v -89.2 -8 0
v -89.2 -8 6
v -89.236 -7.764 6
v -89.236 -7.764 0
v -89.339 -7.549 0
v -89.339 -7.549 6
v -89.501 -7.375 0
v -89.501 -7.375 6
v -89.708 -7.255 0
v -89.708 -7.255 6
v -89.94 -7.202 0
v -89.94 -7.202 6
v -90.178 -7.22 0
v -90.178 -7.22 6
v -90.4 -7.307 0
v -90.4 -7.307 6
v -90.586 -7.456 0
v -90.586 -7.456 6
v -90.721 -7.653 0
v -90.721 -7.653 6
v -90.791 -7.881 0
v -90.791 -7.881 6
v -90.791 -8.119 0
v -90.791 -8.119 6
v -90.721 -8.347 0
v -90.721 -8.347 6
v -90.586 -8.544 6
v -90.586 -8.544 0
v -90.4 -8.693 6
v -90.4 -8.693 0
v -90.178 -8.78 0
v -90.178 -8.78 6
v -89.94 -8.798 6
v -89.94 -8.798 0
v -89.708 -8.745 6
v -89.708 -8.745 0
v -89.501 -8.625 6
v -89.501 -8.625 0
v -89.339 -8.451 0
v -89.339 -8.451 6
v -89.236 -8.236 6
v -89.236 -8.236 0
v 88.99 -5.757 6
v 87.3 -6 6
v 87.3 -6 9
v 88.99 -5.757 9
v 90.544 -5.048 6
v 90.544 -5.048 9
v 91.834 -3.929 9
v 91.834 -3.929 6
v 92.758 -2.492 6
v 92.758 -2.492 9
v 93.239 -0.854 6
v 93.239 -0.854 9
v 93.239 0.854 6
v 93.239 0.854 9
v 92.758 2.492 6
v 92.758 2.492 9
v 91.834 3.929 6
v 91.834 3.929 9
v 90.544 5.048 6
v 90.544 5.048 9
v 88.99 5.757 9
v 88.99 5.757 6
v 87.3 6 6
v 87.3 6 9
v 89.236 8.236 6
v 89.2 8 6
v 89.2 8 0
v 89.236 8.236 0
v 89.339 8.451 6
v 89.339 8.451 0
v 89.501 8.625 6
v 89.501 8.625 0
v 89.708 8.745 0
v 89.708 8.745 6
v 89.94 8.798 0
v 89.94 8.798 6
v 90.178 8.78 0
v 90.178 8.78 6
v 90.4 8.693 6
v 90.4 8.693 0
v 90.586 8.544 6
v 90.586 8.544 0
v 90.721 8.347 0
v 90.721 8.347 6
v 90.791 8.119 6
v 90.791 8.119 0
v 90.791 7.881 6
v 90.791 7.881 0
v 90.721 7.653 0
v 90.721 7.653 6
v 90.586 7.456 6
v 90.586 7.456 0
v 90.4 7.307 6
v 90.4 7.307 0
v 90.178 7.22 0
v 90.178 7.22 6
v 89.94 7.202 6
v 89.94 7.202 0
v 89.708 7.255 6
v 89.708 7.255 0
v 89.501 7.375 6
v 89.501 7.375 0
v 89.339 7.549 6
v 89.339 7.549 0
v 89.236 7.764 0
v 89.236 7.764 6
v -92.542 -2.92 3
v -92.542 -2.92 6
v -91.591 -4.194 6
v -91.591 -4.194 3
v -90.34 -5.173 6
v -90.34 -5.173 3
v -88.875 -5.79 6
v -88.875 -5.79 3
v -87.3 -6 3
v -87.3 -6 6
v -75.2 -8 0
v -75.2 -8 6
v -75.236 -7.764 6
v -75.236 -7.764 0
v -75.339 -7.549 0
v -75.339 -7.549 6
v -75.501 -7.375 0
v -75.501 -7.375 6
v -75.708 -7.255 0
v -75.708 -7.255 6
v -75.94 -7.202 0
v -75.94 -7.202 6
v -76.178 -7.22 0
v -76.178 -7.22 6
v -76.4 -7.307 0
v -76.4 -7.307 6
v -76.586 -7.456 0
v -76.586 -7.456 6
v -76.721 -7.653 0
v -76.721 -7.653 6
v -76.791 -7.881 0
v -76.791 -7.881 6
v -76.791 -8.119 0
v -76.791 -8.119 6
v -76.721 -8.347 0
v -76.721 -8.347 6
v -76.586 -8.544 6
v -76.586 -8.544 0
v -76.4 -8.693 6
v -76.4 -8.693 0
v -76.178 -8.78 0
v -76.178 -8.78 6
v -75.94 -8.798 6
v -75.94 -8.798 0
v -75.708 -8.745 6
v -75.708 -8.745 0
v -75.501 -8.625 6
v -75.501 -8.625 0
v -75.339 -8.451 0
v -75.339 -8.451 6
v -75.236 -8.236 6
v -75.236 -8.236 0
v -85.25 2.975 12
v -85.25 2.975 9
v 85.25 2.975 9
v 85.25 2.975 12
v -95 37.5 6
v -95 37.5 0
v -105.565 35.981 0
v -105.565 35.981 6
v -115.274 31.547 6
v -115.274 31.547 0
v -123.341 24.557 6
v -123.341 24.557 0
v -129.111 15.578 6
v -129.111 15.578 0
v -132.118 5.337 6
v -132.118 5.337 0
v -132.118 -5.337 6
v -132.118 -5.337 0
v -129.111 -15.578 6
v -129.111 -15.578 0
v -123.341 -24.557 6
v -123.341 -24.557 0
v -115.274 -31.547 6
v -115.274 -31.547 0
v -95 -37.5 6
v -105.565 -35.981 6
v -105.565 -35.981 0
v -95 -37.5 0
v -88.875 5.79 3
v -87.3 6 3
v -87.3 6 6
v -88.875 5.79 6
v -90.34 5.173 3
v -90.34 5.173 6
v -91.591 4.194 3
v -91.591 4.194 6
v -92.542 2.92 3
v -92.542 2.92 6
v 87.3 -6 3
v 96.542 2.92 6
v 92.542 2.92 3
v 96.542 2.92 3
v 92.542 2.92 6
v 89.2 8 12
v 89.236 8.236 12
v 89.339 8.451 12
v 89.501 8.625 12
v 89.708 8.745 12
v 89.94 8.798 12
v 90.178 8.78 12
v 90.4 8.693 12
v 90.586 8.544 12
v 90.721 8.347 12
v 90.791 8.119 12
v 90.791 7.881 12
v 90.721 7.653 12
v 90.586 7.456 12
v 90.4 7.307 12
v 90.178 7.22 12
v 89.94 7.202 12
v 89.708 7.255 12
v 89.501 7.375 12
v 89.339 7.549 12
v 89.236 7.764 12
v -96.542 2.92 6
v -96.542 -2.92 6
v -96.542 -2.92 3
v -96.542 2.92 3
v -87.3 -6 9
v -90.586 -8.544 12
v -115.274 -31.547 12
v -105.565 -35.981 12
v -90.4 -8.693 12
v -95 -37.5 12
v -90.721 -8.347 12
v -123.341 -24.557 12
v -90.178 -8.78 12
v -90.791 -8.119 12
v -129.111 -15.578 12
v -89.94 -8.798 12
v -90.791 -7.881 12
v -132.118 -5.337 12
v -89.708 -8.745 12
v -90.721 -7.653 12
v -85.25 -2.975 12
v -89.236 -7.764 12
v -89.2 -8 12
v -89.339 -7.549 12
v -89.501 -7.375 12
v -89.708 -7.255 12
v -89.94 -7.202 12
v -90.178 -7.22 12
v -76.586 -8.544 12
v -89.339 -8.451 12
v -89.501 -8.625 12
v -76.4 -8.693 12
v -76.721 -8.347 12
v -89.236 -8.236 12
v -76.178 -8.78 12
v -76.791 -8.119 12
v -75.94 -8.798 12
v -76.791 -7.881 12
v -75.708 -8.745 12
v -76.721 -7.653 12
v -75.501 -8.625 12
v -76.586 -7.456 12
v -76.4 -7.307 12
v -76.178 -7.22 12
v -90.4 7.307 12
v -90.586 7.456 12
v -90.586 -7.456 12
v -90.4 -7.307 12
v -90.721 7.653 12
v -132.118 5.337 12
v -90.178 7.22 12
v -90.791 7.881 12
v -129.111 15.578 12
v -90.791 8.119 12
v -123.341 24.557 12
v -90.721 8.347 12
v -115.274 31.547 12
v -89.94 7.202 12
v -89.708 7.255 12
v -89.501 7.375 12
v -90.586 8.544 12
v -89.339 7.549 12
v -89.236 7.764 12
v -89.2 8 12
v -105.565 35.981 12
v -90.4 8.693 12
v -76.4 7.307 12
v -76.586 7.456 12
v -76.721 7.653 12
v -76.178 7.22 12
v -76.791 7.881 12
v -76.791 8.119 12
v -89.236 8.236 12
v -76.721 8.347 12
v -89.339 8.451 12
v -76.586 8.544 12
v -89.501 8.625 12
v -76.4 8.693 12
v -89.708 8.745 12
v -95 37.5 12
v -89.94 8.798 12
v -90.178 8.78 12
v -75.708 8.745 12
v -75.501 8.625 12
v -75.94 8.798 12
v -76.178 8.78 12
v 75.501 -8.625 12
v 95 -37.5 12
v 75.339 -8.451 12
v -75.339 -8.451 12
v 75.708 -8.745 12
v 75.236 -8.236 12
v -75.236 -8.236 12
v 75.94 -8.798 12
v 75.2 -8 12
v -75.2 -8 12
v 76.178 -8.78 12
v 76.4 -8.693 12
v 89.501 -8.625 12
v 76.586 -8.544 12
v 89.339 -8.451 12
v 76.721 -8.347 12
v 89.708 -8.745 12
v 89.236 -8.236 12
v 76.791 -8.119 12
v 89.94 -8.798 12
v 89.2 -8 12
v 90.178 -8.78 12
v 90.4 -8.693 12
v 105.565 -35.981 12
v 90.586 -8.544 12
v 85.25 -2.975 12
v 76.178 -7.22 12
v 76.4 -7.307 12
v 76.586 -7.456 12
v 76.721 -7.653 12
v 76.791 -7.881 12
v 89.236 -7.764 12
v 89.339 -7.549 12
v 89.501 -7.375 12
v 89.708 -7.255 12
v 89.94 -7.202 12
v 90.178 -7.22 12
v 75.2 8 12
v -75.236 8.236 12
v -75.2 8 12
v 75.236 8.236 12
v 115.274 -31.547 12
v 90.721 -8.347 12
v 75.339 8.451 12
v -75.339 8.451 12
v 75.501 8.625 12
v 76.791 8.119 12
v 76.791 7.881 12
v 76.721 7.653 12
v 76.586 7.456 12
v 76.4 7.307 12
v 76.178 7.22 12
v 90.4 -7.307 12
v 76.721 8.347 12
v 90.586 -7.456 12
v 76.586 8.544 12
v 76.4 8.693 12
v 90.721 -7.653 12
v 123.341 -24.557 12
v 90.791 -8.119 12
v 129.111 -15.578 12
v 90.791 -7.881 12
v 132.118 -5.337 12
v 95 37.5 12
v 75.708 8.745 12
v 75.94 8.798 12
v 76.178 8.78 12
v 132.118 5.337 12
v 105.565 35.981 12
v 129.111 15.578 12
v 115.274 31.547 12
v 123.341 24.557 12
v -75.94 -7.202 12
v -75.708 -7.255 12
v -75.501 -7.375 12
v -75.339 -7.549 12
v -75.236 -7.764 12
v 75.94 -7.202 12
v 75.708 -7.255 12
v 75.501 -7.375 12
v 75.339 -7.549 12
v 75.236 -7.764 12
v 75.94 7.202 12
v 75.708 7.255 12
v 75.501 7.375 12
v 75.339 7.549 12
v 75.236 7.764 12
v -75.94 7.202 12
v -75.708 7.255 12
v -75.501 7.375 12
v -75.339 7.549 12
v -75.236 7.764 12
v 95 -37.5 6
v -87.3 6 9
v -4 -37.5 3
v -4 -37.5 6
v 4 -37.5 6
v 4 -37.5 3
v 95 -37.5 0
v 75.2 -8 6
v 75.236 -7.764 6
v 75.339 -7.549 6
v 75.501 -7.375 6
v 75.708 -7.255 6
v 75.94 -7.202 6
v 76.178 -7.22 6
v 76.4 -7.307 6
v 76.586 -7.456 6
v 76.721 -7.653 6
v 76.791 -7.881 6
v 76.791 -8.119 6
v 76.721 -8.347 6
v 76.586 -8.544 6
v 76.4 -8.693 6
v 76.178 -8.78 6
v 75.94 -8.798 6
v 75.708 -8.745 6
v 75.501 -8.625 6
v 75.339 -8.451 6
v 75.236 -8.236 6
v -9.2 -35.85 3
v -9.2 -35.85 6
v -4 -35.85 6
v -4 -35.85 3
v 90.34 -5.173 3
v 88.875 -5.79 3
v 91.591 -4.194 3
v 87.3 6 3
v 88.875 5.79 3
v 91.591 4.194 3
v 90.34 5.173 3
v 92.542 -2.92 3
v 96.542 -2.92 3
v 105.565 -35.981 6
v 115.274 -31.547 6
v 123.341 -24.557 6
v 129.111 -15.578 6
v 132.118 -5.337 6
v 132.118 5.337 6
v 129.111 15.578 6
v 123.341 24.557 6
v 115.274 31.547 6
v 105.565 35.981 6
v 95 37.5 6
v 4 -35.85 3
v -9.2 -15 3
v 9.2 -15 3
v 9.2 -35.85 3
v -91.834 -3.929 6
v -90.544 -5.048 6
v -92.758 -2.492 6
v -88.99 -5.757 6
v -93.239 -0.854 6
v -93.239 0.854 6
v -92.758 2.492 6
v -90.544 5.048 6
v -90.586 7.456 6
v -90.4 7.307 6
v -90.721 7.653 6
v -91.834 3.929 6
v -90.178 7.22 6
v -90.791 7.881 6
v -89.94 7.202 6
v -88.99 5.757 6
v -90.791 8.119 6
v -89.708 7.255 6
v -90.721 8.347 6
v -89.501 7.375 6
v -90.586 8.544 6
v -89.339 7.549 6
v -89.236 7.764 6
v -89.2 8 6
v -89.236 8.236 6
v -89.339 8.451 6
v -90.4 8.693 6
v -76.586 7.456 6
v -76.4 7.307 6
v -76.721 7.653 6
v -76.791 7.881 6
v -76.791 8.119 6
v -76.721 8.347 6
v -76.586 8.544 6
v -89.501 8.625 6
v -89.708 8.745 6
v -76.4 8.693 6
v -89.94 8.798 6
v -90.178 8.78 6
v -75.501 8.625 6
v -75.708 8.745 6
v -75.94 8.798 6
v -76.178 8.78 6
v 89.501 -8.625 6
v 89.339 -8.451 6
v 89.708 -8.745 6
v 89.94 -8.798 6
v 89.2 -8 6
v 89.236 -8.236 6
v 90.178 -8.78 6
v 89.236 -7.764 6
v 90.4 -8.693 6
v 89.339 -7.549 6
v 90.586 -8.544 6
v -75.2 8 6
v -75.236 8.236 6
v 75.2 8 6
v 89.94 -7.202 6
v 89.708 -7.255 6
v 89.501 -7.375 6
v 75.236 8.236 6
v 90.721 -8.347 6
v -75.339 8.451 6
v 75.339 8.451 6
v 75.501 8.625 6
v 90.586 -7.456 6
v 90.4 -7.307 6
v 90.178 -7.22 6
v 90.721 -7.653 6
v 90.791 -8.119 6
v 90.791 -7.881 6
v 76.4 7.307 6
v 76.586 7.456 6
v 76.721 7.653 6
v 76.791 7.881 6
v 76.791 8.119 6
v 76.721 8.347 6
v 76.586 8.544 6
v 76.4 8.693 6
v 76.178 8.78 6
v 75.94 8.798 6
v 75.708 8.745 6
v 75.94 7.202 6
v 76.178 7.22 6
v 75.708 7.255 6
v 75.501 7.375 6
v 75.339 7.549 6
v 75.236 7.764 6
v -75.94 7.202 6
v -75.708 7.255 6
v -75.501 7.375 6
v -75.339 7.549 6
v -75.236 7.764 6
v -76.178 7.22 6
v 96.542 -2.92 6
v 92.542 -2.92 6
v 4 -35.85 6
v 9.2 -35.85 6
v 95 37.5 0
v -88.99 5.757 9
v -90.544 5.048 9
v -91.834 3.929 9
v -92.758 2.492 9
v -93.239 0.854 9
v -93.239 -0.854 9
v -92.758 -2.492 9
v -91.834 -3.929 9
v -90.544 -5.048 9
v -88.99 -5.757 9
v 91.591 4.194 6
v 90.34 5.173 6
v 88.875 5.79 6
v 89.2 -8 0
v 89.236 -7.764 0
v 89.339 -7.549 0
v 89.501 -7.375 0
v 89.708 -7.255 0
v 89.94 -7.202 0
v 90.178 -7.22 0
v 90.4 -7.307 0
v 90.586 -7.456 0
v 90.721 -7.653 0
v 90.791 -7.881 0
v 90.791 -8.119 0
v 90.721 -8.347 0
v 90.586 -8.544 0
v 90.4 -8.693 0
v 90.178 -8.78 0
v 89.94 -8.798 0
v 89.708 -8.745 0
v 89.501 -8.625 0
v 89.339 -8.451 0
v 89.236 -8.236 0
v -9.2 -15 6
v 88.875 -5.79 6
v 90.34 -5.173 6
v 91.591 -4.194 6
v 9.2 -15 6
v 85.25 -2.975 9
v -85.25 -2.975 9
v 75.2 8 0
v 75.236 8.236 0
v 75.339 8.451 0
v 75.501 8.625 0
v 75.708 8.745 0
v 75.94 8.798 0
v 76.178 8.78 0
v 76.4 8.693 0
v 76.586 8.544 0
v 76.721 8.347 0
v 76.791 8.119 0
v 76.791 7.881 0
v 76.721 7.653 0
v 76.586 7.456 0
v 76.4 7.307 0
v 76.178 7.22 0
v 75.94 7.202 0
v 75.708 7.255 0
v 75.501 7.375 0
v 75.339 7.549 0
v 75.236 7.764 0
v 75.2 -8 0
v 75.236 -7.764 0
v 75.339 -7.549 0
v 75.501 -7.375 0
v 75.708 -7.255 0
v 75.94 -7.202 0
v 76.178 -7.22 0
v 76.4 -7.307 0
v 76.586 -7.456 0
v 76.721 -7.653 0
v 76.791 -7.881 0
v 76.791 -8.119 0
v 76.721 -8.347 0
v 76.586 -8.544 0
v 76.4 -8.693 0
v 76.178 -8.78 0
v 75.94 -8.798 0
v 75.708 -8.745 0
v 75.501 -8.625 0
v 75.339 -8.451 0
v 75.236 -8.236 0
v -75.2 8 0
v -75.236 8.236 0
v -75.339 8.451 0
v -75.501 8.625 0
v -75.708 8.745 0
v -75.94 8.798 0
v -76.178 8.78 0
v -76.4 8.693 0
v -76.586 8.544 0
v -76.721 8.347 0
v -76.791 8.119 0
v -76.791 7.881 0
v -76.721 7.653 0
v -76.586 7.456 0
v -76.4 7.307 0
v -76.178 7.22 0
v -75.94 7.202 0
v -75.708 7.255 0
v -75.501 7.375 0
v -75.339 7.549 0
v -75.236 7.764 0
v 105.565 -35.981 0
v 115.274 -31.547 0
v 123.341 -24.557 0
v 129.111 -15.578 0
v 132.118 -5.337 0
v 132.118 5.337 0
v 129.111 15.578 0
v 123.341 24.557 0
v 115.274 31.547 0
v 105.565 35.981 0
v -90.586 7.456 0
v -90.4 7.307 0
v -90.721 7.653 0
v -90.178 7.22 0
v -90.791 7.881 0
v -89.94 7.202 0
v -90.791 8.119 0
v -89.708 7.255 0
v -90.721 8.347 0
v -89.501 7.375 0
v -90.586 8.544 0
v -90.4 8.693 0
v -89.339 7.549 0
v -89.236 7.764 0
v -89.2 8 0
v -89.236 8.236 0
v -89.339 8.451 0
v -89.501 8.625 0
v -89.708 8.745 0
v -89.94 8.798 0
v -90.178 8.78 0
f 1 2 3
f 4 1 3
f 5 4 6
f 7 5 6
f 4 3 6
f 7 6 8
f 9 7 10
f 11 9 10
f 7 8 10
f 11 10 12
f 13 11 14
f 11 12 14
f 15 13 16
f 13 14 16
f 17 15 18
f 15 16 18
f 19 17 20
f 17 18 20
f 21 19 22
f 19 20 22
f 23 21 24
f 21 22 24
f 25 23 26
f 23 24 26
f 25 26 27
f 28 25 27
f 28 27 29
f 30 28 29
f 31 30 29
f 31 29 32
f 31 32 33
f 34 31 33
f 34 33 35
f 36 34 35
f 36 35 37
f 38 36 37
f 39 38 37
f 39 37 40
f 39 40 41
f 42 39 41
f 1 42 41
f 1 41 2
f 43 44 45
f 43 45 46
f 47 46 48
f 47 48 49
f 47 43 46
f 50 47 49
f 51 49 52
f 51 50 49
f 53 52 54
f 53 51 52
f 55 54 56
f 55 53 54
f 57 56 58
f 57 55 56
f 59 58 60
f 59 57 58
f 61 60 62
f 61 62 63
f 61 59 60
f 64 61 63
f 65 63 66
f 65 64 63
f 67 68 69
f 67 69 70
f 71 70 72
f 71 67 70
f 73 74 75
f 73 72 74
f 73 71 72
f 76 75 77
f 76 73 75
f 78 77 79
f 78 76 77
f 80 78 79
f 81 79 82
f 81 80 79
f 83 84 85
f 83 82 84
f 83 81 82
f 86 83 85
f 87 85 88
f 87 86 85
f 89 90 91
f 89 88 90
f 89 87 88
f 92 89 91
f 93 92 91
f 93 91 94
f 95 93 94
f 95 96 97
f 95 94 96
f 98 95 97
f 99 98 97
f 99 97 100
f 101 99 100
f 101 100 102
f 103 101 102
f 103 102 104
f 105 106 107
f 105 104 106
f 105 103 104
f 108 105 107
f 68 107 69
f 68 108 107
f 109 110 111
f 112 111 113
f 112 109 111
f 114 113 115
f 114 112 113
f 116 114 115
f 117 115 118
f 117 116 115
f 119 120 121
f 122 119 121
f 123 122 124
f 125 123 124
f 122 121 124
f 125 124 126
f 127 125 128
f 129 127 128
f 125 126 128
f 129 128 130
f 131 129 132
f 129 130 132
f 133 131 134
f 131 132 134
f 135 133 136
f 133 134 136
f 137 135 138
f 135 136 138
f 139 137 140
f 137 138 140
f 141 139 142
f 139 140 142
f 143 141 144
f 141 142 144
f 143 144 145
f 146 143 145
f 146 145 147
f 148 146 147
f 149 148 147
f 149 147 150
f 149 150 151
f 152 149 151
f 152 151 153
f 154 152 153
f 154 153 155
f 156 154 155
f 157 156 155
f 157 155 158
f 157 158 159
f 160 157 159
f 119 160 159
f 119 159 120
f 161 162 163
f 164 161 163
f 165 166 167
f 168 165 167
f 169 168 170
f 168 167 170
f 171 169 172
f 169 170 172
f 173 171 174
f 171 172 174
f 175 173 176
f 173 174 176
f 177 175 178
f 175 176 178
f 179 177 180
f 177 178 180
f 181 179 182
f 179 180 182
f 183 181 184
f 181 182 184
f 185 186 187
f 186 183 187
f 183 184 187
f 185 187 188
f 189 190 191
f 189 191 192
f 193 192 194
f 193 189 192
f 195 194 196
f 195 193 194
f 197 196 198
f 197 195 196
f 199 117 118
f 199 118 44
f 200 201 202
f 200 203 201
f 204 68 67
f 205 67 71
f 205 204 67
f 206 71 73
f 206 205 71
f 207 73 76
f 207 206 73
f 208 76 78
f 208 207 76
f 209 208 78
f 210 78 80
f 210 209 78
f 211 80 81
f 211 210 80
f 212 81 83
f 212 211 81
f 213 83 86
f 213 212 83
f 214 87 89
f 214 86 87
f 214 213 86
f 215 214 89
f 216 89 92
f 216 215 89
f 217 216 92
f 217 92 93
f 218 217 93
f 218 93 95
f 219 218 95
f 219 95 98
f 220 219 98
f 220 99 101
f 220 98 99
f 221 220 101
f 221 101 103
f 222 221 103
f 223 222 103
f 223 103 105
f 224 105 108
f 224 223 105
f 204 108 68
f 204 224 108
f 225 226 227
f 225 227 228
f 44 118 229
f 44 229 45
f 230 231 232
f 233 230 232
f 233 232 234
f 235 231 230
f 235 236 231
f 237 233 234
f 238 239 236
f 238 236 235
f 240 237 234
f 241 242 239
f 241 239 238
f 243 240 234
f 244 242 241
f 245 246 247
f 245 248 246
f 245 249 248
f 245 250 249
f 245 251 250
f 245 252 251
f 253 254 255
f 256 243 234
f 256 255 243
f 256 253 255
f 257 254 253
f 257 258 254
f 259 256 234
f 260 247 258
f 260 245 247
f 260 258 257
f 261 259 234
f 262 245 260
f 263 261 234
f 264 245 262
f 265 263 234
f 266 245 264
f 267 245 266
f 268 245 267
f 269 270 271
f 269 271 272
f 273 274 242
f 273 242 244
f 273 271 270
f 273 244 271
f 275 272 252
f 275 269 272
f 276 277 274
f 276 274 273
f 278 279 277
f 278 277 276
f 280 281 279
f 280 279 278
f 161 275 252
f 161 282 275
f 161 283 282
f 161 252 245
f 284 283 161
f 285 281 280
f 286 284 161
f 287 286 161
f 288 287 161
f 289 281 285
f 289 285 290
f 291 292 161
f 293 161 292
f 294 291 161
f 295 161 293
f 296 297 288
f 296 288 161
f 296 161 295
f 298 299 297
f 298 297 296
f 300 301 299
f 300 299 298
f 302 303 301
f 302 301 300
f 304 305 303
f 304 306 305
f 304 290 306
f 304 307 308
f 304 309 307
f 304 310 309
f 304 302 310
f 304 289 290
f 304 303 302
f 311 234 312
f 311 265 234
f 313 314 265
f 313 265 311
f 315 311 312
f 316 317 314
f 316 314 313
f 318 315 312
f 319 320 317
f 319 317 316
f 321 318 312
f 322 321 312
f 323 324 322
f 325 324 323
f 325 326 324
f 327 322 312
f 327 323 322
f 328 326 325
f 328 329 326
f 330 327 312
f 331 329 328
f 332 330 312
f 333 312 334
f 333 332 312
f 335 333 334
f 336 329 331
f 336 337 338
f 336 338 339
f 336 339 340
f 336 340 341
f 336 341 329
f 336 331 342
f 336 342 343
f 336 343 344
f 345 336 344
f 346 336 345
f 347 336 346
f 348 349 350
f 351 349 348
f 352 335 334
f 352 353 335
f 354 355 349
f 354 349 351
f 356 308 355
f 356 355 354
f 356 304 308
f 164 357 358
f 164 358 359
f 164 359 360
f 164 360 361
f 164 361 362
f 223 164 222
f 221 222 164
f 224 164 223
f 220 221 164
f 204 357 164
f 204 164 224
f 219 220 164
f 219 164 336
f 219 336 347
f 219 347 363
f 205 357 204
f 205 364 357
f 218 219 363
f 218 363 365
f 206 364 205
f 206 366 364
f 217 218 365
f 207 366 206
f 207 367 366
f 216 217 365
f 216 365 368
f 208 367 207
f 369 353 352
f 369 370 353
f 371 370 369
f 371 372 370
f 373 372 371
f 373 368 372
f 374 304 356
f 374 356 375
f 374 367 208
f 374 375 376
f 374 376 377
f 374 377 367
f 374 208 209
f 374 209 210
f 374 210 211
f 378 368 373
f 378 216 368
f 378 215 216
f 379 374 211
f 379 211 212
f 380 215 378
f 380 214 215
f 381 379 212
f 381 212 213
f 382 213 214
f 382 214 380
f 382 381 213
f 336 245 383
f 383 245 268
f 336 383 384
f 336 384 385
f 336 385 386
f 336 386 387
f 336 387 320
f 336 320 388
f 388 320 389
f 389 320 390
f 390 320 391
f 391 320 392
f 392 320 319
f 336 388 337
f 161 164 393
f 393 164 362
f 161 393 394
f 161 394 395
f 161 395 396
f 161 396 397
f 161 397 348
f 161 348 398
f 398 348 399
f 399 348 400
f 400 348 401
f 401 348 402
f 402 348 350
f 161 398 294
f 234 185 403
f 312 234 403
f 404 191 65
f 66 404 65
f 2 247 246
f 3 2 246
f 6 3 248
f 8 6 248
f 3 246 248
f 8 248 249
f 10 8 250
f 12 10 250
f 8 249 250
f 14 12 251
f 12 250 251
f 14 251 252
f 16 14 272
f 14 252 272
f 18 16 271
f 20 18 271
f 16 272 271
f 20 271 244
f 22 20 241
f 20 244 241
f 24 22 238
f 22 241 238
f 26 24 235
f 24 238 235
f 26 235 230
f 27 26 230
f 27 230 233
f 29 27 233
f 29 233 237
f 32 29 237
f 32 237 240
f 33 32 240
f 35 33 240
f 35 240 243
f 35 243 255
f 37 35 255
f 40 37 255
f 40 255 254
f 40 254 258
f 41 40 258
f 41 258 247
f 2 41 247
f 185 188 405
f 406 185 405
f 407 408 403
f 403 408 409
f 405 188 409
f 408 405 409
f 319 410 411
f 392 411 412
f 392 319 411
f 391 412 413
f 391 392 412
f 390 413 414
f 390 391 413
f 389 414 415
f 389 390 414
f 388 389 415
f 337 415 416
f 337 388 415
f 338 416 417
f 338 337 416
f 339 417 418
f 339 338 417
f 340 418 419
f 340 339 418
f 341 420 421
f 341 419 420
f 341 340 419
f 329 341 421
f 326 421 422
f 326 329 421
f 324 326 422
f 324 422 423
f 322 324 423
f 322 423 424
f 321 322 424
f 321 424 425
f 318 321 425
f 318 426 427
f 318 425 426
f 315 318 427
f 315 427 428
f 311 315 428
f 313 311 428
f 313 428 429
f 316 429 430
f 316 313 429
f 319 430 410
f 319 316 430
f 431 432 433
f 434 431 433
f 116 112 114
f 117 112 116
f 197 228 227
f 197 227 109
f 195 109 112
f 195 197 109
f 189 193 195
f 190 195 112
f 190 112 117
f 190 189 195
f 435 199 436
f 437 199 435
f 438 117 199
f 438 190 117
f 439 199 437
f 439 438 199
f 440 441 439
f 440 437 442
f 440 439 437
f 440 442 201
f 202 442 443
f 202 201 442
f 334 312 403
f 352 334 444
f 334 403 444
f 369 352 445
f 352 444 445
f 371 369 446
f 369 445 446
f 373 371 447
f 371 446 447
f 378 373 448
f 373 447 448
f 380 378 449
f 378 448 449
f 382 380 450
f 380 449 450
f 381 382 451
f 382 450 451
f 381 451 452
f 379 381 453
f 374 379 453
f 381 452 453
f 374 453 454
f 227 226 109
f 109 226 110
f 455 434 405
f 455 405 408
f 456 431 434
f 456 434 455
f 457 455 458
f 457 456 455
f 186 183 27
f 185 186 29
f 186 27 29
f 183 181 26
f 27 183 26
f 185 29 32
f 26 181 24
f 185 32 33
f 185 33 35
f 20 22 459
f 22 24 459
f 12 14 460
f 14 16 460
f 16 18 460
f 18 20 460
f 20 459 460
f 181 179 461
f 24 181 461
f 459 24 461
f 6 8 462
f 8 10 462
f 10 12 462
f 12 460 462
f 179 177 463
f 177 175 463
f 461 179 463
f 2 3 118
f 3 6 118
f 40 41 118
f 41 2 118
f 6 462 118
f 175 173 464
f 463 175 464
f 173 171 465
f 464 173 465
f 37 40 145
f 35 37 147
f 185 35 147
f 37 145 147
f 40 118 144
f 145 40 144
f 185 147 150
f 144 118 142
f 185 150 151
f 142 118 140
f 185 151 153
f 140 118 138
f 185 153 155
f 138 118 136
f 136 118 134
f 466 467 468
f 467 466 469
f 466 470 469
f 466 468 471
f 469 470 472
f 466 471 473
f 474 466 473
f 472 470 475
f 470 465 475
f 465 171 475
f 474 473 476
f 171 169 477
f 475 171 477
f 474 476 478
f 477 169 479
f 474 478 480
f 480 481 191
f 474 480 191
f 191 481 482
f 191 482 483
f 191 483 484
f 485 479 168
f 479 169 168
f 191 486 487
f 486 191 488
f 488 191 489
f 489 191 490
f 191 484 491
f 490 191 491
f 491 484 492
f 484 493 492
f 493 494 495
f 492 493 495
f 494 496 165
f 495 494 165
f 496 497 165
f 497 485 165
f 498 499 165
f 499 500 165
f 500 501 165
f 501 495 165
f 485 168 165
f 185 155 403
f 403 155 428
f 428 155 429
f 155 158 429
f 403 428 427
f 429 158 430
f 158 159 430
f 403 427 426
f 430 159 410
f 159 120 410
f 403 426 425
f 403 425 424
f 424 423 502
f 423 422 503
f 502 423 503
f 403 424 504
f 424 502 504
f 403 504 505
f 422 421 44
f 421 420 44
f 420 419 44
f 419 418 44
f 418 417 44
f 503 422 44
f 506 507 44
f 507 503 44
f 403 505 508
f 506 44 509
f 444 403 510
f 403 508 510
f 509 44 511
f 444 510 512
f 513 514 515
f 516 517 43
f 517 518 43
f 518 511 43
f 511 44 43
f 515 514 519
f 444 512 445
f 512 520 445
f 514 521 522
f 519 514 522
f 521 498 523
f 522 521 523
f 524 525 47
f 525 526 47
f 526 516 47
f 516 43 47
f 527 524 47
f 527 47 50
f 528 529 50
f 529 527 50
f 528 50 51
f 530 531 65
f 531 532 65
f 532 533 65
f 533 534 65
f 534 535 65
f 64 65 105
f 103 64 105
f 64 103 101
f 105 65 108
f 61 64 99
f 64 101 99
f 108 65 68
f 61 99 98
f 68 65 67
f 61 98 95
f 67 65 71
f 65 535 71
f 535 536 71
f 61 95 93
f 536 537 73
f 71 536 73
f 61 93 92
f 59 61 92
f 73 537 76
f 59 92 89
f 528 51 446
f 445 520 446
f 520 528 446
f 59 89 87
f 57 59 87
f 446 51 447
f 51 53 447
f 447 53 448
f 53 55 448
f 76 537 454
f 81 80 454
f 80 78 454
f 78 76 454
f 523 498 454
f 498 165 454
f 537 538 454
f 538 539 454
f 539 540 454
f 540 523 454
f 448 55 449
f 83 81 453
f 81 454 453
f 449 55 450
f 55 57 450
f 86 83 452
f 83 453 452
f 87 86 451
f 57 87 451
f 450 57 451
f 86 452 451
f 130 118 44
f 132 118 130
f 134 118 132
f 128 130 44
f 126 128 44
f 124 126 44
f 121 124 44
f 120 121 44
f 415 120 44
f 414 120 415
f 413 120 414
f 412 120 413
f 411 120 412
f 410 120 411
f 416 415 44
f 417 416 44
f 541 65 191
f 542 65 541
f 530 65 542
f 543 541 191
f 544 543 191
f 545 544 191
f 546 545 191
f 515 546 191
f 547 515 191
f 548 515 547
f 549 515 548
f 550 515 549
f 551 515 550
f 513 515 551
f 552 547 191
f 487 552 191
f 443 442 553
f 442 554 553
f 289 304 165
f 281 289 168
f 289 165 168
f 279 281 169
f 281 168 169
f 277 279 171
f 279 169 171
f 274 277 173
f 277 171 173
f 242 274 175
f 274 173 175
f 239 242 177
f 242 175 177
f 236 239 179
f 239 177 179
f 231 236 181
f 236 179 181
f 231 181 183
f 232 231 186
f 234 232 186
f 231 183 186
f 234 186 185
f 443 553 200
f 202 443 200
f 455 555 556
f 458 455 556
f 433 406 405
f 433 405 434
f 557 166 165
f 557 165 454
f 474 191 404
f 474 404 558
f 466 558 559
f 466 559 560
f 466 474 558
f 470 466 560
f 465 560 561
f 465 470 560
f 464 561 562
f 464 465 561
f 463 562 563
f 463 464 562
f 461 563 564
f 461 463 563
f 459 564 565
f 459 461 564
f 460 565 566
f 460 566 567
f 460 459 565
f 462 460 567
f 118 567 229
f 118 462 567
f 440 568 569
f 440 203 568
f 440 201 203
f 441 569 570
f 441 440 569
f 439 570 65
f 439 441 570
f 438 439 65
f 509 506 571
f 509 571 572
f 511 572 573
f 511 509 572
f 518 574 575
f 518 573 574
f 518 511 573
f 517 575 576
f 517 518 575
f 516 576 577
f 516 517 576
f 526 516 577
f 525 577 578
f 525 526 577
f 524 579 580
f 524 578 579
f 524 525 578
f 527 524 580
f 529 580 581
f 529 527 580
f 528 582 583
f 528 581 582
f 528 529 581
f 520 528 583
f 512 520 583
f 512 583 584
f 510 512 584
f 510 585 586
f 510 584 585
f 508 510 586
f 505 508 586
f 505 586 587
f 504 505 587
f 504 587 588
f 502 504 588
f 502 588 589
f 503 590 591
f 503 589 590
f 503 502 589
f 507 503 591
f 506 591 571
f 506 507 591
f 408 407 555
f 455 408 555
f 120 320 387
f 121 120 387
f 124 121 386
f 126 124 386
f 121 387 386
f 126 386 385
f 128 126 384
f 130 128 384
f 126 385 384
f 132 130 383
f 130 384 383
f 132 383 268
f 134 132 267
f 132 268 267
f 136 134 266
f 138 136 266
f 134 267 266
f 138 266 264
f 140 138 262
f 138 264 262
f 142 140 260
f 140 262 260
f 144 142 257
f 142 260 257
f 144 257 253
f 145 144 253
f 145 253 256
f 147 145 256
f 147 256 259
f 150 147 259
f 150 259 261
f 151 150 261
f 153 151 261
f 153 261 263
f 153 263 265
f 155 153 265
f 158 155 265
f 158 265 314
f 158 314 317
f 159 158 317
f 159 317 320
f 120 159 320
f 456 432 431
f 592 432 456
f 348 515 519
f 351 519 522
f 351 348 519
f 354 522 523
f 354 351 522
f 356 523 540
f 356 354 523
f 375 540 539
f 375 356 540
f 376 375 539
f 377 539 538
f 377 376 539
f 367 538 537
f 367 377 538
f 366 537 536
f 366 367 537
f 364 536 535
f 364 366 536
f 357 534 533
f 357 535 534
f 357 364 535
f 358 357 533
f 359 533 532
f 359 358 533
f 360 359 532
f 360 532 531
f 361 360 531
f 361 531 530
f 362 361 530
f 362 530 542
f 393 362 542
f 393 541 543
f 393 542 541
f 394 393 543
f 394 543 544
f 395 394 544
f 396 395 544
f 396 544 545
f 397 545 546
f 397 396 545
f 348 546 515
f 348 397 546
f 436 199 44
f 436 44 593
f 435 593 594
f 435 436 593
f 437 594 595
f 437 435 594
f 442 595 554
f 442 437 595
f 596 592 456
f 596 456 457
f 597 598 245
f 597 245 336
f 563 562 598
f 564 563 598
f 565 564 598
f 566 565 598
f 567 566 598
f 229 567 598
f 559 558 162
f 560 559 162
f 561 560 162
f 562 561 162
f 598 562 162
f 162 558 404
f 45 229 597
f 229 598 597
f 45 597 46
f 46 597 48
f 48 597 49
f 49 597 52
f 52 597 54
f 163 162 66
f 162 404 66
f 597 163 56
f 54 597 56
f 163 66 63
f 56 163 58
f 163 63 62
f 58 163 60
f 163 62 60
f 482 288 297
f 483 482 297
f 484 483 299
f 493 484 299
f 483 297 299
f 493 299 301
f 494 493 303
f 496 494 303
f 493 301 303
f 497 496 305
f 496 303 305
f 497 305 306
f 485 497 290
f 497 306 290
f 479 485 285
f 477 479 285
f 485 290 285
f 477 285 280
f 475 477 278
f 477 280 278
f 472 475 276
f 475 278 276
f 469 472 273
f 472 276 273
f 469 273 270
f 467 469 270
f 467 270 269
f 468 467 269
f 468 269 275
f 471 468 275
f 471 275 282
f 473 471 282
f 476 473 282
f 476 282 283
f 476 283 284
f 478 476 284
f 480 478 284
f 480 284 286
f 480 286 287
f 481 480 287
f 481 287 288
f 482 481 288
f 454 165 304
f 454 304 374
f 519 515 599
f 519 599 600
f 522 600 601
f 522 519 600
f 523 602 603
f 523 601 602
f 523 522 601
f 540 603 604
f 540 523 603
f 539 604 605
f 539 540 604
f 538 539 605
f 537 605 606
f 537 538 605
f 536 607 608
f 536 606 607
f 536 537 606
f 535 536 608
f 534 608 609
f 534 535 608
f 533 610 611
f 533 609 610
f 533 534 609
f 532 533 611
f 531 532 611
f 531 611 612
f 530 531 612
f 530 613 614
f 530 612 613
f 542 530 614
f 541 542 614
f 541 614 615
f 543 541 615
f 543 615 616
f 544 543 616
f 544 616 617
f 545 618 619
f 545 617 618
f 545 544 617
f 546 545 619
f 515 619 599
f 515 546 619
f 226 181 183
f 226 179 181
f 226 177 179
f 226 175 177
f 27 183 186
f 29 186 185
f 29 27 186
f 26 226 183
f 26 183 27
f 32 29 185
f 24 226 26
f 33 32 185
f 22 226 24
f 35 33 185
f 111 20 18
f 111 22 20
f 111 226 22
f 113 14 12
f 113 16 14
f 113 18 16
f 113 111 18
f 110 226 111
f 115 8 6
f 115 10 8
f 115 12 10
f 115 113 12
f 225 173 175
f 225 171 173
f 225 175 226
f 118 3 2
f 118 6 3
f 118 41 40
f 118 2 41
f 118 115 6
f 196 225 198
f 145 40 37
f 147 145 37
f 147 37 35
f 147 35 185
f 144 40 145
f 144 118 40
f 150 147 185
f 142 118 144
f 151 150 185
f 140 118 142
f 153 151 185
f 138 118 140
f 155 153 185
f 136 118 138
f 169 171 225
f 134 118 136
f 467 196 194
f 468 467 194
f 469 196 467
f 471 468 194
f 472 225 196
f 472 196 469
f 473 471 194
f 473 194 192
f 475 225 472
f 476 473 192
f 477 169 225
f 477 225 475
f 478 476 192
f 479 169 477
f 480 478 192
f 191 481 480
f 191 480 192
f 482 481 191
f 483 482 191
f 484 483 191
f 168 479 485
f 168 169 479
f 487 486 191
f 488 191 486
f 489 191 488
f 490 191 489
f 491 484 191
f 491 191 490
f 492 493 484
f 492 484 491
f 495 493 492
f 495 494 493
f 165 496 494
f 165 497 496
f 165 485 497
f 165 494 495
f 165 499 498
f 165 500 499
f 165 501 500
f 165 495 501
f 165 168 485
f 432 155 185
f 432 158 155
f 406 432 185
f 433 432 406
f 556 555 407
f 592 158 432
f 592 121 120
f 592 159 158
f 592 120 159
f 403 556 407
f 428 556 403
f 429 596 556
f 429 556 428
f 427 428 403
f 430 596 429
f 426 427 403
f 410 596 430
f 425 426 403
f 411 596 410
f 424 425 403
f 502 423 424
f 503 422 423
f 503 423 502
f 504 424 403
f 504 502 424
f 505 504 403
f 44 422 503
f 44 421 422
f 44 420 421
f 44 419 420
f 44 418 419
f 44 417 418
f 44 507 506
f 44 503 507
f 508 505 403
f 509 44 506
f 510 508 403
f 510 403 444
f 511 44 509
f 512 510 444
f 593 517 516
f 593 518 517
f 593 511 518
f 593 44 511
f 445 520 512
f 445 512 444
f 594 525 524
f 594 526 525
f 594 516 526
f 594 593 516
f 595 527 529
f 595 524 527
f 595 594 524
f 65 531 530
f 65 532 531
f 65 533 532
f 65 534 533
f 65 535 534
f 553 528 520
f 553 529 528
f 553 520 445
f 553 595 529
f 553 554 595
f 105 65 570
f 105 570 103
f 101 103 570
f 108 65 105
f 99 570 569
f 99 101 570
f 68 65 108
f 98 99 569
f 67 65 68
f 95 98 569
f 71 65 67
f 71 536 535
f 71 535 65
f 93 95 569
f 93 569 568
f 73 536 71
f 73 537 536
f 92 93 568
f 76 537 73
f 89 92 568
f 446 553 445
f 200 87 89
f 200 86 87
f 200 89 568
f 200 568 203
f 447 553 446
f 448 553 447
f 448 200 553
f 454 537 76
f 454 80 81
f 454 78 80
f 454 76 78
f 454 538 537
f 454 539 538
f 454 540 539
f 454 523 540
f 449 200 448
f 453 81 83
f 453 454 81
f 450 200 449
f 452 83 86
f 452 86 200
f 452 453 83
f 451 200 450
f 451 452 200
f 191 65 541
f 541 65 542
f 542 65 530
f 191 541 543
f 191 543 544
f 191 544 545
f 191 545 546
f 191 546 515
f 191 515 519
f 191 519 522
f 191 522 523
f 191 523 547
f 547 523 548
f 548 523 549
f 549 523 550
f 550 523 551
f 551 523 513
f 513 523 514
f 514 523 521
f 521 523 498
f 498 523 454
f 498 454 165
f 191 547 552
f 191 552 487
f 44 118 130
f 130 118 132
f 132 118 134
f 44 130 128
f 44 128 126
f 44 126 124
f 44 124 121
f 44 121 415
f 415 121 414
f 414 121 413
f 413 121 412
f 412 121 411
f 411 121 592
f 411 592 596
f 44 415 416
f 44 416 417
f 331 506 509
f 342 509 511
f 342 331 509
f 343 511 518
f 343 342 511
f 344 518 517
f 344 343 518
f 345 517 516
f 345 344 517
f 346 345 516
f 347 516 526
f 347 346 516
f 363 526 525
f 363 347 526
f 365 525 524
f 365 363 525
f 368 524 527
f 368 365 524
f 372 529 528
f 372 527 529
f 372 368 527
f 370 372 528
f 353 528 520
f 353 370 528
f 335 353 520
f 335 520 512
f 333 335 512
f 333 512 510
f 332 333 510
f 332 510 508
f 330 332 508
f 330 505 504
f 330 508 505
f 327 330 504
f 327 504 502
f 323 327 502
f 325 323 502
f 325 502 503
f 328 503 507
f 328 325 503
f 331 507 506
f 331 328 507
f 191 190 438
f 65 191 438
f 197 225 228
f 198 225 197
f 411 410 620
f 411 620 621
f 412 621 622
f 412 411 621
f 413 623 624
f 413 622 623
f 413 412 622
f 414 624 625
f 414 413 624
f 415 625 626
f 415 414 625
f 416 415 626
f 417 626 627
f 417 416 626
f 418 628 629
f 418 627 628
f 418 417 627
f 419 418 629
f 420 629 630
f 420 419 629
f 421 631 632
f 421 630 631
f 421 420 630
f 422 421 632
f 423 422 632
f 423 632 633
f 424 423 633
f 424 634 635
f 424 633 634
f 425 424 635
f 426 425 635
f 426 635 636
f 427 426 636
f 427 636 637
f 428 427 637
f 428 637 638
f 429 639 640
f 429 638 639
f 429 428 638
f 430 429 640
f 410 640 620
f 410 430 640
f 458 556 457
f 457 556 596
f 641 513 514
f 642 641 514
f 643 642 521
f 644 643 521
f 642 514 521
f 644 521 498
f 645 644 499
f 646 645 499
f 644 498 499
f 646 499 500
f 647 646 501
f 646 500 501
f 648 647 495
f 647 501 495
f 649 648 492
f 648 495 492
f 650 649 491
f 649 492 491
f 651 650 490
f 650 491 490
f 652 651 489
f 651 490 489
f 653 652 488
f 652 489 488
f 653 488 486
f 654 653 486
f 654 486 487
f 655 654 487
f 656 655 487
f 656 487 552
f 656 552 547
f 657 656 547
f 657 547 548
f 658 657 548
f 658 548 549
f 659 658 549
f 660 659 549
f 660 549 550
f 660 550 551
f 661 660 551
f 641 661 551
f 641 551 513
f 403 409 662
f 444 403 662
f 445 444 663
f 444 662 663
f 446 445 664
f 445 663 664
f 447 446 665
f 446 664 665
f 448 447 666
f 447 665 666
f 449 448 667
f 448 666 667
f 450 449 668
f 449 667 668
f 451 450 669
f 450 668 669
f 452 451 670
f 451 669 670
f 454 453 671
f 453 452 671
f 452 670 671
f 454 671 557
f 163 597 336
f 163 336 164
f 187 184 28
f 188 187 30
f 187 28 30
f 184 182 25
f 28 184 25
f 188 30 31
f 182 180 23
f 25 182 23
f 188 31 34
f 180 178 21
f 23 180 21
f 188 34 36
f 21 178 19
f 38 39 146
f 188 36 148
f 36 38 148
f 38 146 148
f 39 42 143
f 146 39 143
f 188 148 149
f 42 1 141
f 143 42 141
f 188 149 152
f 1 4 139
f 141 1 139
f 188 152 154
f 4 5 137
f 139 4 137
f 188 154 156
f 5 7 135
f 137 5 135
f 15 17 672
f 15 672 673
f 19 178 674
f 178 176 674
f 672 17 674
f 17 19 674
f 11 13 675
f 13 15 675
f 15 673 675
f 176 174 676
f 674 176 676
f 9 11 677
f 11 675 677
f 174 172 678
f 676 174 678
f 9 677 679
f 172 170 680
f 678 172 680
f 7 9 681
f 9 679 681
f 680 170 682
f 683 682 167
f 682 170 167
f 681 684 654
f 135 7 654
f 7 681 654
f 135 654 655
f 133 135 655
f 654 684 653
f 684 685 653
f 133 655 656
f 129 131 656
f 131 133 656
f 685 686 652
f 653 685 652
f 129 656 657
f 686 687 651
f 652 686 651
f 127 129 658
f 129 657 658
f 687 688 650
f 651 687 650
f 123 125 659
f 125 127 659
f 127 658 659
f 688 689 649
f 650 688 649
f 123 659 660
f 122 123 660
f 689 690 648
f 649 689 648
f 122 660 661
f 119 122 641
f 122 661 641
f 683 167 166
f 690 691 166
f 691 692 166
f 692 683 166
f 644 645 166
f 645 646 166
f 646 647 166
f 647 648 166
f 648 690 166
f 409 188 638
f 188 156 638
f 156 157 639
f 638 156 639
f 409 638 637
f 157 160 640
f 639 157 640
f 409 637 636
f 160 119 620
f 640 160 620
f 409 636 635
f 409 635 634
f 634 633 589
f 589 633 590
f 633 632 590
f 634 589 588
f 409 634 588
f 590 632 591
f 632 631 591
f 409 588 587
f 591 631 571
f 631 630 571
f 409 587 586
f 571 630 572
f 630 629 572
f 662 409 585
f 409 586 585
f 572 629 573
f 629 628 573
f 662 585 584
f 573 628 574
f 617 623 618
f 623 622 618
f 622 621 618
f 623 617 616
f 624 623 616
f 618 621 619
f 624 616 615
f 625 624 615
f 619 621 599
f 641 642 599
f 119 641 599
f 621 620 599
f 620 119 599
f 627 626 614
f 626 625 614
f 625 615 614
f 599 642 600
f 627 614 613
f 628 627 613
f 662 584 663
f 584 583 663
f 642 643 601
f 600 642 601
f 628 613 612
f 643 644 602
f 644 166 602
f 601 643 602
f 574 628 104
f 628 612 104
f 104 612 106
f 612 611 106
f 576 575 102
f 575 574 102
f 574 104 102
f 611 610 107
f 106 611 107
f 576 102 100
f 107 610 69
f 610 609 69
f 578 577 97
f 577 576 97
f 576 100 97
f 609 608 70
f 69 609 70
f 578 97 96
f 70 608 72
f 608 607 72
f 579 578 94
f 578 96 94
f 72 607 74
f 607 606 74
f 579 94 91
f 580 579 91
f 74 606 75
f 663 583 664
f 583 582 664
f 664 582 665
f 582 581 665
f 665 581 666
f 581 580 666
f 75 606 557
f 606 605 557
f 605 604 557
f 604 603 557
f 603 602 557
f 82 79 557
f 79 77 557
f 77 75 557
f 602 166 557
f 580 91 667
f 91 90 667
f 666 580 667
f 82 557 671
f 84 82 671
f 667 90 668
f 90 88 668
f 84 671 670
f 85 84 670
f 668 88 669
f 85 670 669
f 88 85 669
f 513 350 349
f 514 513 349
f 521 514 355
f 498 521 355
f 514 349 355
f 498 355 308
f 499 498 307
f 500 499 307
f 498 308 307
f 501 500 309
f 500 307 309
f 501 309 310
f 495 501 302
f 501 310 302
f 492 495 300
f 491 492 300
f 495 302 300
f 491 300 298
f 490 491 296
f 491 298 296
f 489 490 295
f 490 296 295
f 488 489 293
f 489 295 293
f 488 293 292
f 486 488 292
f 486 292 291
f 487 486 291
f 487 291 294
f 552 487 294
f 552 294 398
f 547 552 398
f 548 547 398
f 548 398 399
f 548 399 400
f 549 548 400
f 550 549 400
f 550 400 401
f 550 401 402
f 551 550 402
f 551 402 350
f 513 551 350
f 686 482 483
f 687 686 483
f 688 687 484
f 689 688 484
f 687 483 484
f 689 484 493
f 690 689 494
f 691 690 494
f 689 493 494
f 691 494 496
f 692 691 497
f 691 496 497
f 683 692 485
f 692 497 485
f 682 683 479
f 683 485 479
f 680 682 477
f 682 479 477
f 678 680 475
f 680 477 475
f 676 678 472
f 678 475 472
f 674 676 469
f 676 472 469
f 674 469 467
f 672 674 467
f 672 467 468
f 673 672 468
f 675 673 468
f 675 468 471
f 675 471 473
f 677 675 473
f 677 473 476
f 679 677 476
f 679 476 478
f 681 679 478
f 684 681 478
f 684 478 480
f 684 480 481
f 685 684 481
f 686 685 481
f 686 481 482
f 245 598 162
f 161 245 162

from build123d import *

# Parameters (mm, degrees)
BOX_BOTTOM_HALF_0_W     = 266.988319
BOX_BOTTOM_HALF_0_H     = 77
BOX_BOTTOM_HALF_0_DEPTH = 7
PAD_DEPTH               = 6
POCKET_DEPTH            = 3
SKETCH002_W             = 18.4
SKETCH002_H             = 20.85
POCKET001_DEPTH         = 3
SKETCH003_W             = 8
SKETCH003_H             = 1.65
POCKET002_DEPTH         = 3
PAD001_DEPTH            = 3
SKETCH005_W             = 170.5
SKETCH005_H             = 5.95
PAD002_DEPTH            = 3
SKETCH007_R             = 0.8
POCKET003_DEPTH         = 563.341185
SKETCH008_W             = 4
SKETCH008_H             = 5.84
POCKET004_DEPTH         = 3


with BuildPart() as box_bottom_half_0_body:
    # box_bottom_half_0 → box_bottom_half_0 (new body)
    with BuildSketch(Plane(origin=(-133.49416, -38.5, -1), x_dir=(1, 0, 0), z_dir=(0, 0, 1))):
        with Locations((133.494159, 38.5)):
            Rectangle(BOX_BOTTOM_HALF_0_W, BOX_BOTTOM_HALF_0_H)
    extrude(amount=BOX_BOTTOM_HALF_0_DEPTH)


with BuildPart() as body:
    # Sketch → Pad (new body)
    with BuildSketch(Plane.XY):
        with BuildLine():
            ThreePointArc((-95, 37.5), (-132.5, 0), (-95, -37.5))
            Line((-95, -37.5), (95, -37.5))
            ThreePointArc((95, -37.5), (132.5, 0), (95, 37.5))
            Line((-95, 37.5), (95, 37.5))
        make_face()
    extrude(amount=PAD_DEPTH)

    # Sketch001 (on Face6 of Pad) → Pocket (cut)
    with BuildSketch(Plane.XY.offset(6)):
        with BuildLine():
            ThreePointArc((-87.3, 6), (-93.3, 0), (-87.3, -6))
            Line((-87.3, -6), (87.3, -6))
            ThreePointArc((87.3, -6), (93.3, 0), (87.3, 6))
            Line((-87.3, 6), (87.3, 6))
        make_face()
    extrude(amount=-POCKET_DEPTH, mode=Mode.SUBTRACT)

    # Sketch002 (on Face5 of Pocket) → Pocket001 (cut)
    with BuildSketch(Plane.XY.offset(6)):
        with Locations((0, -25.425)):
            Rectangle(SKETCH002_W, SKETCH002_H)
    extrude(amount=-POCKET001_DEPTH, mode=Mode.SUBTRACT)

    # Sketch003 (on Face5 of Pocket001) → Pocket002 (cut)
    with BuildSketch(Plane.XY.offset(6)):
        with Locations((0, -36.675)):
            Rectangle(SKETCH003_W, SKETCH003_H)
    extrude(amount=-POCKET002_DEPTH, mode=Mode.SUBTRACT)

    # Sketch004 (on Face5 of Pocket002) → Pad001 (join)
    with BuildSketch(Plane.XY.offset(6)):
        with BuildLine():
            ThreePointArc((-95, 37.5), (-132.5, 0), (-95, -37.5))
            Line((-95, -37.5), (95, -37.5))
            ThreePointArc((95, -37.5), (132.5, 0), (95, 37.5))
            Line((-95, 37.5), (95, 37.5))
        make_face()
        with BuildLine():
            ThreePointArc((-87.3, 6), (-93.3, 0), (-87.3, -6))
            Line((-87.3, -6), (87.3, -6))
            ThreePointArc((87.3, -6), (93.3, 0), (87.3, 6))
            Line((-87.3, 6), (87.3, 6))
        make_face(mode=Mode.SUBTRACT)
    extrude(amount=PAD001_DEPTH)

    # Sketch005 (on Face12 of Pad001) → Pad002 (join)
    with BuildSketch(Plane.XY.offset(9)):
        with BuildLine():
            ThreePointArc((-95, 37.5), (-132.5, 0), (-95, -37.5))
            Line((-95, -37.5), (95, -37.5))
            ThreePointArc((95, -37.5), (132.5, 0), (95, 37.5))
            Line((-95, 37.5), (95, 37.5))
        make_face()
        Rectangle(SKETCH005_W, SKETCH005_H, mode=Mode.SUBTRACT)
    extrude(amount=PAD002_DEPTH)

    # Sketch007 (on Face20 of Pad002) → Pocket003 (cut, through all)
    with BuildSketch(Plane.XY.offset(12)):
        with Locations((-90, -8)):
            Circle(SKETCH007_R)
        with Locations((-90, 8)):
            Circle(SKETCH007_R)
        with Locations((-76, 8)):
            Circle(SKETCH007_R)
        with Locations((-76, -8)):
            Circle(SKETCH007_R)
    pocket003 = extrude(amount=-POCKET003_DEPTH, mode=Mode.SUBTRACT)

    # Mirrored: Pocket003 across Sketch007 V_Axis
    add(pocket003.mirror(Plane(origin=(0, 0, 12), x_dir=(0, 0, 1), z_dir=(1, 0, 0))), mode=Mode.SUBTRACT)

    # Sketch008 (on Face5 of Pocket) → Pocket004 (cut)
    with BuildSketch(Plane.XY.offset(6)):
        with Locations((-94.541526, 0)):
            Rectangle(SKETCH008_W, SKETCH008_H)
        with Locations((94.541526, 0)):
            Rectangle(SKETCH008_W, SKETCH008_H)
    extrude(amount=-POCKET004_DEPTH, mode=Mode.SUBTRACT)


with BuildPart() as bottom_half_0_body:
    # bottom_half_0 base: copy of Body
    add(body.part)

    # bottom_half_0: intersect box_bottom_half_0 body
    add(box_bottom_half_0_body.part, mode=Mode.INTERSECT)


with BuildPart() as top_half_0_body:
    # top_half_0 base: copy of Body
    add(body.part)

    # top_half_0: cut box_bottom_half_0 body
    add(box_bottom_half_0_body.part, mode=Mode.SUBTRACT)


solid = Compound([bottom_half_0_body.part, top_half_0_body.part])
